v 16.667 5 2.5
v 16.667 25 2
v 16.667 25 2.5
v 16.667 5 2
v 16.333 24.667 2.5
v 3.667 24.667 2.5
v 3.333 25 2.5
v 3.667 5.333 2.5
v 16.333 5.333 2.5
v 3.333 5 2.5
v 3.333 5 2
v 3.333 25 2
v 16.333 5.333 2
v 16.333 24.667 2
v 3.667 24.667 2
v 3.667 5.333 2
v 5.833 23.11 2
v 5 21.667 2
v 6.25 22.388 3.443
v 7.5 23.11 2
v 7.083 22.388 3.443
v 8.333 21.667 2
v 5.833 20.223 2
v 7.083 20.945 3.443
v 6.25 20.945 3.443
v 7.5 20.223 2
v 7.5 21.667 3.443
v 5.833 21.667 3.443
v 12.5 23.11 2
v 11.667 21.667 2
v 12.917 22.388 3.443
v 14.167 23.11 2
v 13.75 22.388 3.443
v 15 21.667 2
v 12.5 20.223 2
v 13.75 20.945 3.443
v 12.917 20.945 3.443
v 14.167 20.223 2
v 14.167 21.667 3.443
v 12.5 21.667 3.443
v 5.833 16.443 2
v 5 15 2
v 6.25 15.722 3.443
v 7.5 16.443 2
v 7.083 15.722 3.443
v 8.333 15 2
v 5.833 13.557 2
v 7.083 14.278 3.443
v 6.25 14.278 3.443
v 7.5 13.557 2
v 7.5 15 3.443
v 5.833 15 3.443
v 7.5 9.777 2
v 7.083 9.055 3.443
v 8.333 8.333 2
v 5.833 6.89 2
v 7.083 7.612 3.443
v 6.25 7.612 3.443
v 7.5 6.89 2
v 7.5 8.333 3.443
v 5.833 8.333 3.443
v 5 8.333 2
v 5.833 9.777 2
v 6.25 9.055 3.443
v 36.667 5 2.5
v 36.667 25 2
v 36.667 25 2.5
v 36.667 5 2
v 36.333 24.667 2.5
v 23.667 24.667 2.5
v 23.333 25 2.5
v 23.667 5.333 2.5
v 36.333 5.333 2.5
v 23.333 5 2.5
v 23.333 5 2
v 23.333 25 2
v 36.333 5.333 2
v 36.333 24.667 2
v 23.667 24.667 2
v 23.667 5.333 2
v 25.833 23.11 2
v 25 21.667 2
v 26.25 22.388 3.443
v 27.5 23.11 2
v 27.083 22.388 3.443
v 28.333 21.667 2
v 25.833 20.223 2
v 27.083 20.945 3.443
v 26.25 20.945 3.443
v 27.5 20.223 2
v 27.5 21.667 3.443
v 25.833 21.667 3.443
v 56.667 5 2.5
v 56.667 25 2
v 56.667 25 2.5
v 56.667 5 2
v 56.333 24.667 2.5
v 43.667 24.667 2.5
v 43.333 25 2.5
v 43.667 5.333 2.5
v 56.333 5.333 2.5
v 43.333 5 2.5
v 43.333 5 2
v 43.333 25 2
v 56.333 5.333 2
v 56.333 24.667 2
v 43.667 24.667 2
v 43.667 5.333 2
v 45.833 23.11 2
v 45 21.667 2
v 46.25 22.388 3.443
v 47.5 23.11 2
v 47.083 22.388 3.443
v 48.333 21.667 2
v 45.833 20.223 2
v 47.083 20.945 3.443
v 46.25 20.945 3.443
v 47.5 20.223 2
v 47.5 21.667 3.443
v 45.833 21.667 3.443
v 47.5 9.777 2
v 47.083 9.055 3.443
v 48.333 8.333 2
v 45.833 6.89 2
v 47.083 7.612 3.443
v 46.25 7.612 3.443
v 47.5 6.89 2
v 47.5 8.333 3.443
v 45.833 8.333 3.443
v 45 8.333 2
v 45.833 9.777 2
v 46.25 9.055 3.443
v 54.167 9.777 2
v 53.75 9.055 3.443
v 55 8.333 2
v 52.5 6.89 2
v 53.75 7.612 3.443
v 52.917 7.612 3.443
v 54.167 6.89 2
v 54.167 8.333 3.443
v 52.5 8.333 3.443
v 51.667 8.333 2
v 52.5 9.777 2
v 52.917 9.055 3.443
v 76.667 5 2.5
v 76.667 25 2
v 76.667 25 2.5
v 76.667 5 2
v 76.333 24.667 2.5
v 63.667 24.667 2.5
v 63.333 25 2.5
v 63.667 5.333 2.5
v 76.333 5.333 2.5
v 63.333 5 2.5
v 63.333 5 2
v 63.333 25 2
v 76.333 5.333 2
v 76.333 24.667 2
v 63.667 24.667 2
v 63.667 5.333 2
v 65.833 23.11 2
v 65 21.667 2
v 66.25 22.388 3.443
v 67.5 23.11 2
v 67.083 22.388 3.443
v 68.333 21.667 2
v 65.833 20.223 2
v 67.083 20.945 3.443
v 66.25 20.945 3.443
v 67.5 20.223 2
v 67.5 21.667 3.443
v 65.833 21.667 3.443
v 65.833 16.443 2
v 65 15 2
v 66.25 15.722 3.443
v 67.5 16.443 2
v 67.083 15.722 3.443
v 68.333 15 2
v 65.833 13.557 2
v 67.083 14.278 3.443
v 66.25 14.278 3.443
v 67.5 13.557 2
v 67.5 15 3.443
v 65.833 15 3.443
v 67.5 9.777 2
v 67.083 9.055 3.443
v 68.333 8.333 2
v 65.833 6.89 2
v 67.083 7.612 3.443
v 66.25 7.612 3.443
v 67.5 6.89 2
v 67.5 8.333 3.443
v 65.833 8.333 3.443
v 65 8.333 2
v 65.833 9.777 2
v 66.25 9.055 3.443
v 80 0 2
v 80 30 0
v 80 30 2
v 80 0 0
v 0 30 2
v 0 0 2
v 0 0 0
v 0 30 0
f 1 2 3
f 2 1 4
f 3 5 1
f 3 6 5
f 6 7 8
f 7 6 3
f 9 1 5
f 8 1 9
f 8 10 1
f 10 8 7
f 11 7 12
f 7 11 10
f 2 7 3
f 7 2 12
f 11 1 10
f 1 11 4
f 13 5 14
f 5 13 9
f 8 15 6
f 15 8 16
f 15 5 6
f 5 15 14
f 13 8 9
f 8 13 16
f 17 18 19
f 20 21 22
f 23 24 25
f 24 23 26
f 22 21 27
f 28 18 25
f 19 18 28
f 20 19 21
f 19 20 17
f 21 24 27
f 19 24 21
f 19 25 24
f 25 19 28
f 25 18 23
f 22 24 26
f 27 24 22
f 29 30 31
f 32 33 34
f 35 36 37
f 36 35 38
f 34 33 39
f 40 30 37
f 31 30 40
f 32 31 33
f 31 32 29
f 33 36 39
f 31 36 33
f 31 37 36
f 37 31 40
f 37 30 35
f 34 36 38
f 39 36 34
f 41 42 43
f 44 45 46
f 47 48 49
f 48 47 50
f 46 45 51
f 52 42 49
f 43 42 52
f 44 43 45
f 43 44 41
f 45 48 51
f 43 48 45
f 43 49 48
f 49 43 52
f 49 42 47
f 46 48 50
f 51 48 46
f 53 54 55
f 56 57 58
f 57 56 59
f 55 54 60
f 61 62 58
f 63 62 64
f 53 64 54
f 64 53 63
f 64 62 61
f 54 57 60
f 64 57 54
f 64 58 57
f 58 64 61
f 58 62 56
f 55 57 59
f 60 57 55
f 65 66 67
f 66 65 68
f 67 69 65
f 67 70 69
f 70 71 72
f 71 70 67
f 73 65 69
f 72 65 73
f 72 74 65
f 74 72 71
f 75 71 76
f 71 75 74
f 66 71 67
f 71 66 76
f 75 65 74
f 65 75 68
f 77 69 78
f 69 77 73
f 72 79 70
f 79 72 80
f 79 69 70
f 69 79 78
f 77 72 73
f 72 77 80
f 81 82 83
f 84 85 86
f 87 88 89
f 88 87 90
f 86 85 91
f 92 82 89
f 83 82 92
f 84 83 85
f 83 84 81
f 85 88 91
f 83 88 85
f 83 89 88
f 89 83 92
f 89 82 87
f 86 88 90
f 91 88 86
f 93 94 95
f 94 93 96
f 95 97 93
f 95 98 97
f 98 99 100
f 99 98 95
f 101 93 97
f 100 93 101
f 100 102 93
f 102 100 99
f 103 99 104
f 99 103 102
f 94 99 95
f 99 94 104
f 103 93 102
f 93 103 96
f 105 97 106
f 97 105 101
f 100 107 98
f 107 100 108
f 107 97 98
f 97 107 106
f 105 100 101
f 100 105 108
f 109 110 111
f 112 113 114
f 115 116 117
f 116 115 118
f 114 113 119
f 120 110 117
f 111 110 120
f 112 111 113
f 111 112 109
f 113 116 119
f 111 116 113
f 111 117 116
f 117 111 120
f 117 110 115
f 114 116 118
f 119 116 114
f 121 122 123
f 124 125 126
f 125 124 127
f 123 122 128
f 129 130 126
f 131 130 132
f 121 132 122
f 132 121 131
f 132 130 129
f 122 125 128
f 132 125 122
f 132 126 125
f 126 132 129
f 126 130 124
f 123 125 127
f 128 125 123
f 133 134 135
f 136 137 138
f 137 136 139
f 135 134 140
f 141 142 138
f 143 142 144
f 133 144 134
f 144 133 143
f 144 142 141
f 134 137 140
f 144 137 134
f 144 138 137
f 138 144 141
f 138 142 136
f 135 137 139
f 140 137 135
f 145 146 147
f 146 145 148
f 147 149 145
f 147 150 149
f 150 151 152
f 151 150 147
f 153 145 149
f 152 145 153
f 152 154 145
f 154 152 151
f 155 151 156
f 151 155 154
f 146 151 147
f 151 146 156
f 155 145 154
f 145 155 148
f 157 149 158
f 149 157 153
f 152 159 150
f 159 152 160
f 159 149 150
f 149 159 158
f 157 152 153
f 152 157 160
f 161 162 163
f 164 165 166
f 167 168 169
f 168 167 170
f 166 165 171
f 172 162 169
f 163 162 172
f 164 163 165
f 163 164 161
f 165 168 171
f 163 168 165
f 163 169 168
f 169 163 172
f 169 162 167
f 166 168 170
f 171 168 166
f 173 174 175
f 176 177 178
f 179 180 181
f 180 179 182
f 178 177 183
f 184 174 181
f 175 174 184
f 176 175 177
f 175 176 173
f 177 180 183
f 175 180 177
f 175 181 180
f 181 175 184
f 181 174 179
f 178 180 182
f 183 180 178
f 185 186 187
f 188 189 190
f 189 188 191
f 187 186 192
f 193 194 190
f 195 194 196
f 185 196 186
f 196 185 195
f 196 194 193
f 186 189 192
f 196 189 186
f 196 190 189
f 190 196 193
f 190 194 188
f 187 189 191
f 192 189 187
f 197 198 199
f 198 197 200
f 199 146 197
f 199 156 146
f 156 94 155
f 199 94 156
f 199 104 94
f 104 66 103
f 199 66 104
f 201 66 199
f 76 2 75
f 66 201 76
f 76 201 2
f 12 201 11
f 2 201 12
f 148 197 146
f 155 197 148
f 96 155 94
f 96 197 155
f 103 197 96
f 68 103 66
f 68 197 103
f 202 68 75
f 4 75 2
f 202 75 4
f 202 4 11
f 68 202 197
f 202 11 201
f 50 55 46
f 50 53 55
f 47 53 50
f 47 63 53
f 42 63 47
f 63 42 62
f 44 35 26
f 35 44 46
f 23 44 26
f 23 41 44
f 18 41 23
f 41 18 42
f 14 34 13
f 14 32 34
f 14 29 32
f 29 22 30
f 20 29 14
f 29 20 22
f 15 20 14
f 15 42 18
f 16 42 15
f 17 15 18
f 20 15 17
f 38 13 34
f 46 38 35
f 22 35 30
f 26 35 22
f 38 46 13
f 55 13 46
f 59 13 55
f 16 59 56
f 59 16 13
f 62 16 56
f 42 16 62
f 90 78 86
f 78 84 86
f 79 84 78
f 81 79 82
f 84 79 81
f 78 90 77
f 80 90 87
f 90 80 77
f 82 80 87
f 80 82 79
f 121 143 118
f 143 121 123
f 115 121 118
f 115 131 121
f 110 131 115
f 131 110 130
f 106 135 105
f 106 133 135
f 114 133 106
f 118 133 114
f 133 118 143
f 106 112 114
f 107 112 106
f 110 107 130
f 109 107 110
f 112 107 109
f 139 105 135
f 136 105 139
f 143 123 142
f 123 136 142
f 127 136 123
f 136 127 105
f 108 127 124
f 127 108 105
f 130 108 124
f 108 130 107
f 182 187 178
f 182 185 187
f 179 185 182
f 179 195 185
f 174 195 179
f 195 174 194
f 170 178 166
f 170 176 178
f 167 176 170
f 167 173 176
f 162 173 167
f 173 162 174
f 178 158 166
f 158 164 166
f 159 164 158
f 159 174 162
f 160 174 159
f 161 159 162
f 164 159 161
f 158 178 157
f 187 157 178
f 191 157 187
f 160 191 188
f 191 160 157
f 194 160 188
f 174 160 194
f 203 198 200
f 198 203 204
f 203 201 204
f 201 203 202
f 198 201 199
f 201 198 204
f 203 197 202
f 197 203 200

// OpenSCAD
// [FL_INDEX: keywords="openscad, 3d_parametric, Parametric_Braille_Name_Plates_Keyrings, csg_solid" | COT="Parametric OpenSCAD design from 3DCodeverse"]
// Title: Parametric Braille Name Plates/Keyrings

//Enter Text
Text="Paul";
//Text height in mm
Size=20; //[10,20,30,40,50]
Show_Build="No"; //[Yes,No]
//Size of build platform (inches)
Build_Size=12; //[8,10,12,14]
//Is this a Key Ring?
Key_Ring="No"; //[Yes,No]

module Insert(Letter,TextSize){

	x=[-TextSize,TextSize,-TextSize,TextSize,-TextSize,TextSize];
	y=[2*TextSize,2*TextSize,0,0,-2*TextSize,-2*TextSize];
	difference(){
		cube([4*TextSize,6*TextSize,1],center=true);
		cube([3.8*TextSize,5.8*TextSize,2],center=true);
	}
	//echo (Letter);
	for (i=[0:5]){
		if ((Letter[i])==1) translate([x[i],y[i],0]) sphere(r=0.5*TextSize);
	}
}
module WORD(Word,TxtSize){

	a=[1,0,0,0,0,0];
	b=[1,0,1,0,0,0];
	c=[1,1,0,0,0,0];
	d=[1,1,0,1,0,0];
	e=[1,0,0,1,0,0];
	f=[1,1,1,0,0,0];
	g=[1,1,1,1,0,0];
	h=[1,0,1,1,0,0];
	i=[0,1,1,0,0,0];
	j=[0,1,1,1,0,0];
	k=[1,0,0,0,1,0];
	l=[1,0,1,0,1,0];
	m=[1,1,0,0,1,0];
	n=[1,1,0,1,1,0];
	o=[1,0,0,1,1,0]; 
	p=[1,1,1,0,1,0];
	q=[1,1,1,1,1,0];
	r=[1,0,1,1,1,0];
	s=[0,1,1,0,1,0];
	t=[0,1,1,1,1,0];
	u=[1,0,0,0,1,1];
	v=[1,0,1,0,1,1];
	w=[0,1,1,1,0,1];
	x=[1,1,0,0,1,1];
	y=[1,1,0,1,1,1];
	z=[1,0,0,1,1,1];
	
	translate([TxtSize*3,0,0])
	for (i=[0:len(Word)-1]){
		translate([TxtSize*i*6,0,0]) {
			if (Word[i]=="A" || Word[i]=="a") Insert(a,TxtSize);
			if (Word[i]=="B" || Word[i]=="b") Insert(b,TxtSize);
			if (Word[i]=="C" || Word[i]=="c") Insert(c,TxtSize);
			if (Word[i]=="D" || Word[i]=="d") Insert(d,TxtSize);
			if (Word[i]=="E" || Word[i]=="e") Insert(e,TxtSize);
			if (Word[i]=="F" || Word[i]=="f") Insert(f,TxtSize);
			if (Word[i]=="G" || Word[i]=="g") Insert(g,TxtSize);
			if (Word[i]=="H" || Word[i]=="h") Insert(h,TxtSize);
			if (Word[i]=="I" || Word[i]=="i") Insert(i,TxtSize);
			if (Word[i]=="J" || Word[i]=="j") Insert(j,TxtSize);
			if (Word[i]=="K" || Word[i]=="k") Insert(k,TxtSize);
			if (Word[i]=="L" || Word[i]=="l") Insert(l,TxtSize);
			if (Word[i]=="M" || Word[i]=="m") Insert(m,TxtSize);
			if (Word[i]=="N" || Word[i]=="n") Insert(n,TxtSize);
			if (Word[i]=="O" || Word[i]=="o") Insert(o,TxtSize);
			if (Word[i]=="P" || Word[i]=="p") Insert(p,TxtSize);
			if (Word[i]=="Q" || Word[i]=="q") Insert(q,TxtSize);
			if (Word[i]=="R" || Word[i]=="r") Insert(r,TxtSize);
			if (Word[i]=="S" || Word[i]=="s") Insert(s,TxtSize);
			if (Word[i]=="T" || Word[i]=="t") Insert(t,TxtSize);
			if (Word[i]=="U" || Word[i]=="u") Insert(u,TxtSize);
			if (Word[i]=="V" || Word[i]=="v") Insert(v,TxtSize);
			if (Word[i]=="W" || Word[i]=="w") Insert(w,TxtSize);
			if (Word[i]=="X" || Word[i]=="x") Insert(x,TxtSize);
			if (Word[i]=="Y" || Word[i]=="y") Insert(y,TxtSize);
			if (Word[i]=="Z" || Word[i]=="z") Insert(z,TxtSize);
		}
	}
}
if (Show_Build=="Yes") { color("blue") translate([-10,-10,-.9]) cube([Build_Size*25.4,Build_Size*25.4,1]);}
if (Key_Ring=="No"){
	translate([0,0,0]) cube([Size*(len(Text)),Size*1.5,Size/10]);
	translate([0,Size*.75,Size/10]) WORD(Text,Size/6);
} else {
	difference(){
		cube([Size*(len(Text))+10,Size*1.5,Size/10]);
		translate([5,Size*.75,-2]) cylinder(r=3,h=Size);
	}
	translate([10,Size*.75,Size/10]) WORD(Text,Size/6);
}
